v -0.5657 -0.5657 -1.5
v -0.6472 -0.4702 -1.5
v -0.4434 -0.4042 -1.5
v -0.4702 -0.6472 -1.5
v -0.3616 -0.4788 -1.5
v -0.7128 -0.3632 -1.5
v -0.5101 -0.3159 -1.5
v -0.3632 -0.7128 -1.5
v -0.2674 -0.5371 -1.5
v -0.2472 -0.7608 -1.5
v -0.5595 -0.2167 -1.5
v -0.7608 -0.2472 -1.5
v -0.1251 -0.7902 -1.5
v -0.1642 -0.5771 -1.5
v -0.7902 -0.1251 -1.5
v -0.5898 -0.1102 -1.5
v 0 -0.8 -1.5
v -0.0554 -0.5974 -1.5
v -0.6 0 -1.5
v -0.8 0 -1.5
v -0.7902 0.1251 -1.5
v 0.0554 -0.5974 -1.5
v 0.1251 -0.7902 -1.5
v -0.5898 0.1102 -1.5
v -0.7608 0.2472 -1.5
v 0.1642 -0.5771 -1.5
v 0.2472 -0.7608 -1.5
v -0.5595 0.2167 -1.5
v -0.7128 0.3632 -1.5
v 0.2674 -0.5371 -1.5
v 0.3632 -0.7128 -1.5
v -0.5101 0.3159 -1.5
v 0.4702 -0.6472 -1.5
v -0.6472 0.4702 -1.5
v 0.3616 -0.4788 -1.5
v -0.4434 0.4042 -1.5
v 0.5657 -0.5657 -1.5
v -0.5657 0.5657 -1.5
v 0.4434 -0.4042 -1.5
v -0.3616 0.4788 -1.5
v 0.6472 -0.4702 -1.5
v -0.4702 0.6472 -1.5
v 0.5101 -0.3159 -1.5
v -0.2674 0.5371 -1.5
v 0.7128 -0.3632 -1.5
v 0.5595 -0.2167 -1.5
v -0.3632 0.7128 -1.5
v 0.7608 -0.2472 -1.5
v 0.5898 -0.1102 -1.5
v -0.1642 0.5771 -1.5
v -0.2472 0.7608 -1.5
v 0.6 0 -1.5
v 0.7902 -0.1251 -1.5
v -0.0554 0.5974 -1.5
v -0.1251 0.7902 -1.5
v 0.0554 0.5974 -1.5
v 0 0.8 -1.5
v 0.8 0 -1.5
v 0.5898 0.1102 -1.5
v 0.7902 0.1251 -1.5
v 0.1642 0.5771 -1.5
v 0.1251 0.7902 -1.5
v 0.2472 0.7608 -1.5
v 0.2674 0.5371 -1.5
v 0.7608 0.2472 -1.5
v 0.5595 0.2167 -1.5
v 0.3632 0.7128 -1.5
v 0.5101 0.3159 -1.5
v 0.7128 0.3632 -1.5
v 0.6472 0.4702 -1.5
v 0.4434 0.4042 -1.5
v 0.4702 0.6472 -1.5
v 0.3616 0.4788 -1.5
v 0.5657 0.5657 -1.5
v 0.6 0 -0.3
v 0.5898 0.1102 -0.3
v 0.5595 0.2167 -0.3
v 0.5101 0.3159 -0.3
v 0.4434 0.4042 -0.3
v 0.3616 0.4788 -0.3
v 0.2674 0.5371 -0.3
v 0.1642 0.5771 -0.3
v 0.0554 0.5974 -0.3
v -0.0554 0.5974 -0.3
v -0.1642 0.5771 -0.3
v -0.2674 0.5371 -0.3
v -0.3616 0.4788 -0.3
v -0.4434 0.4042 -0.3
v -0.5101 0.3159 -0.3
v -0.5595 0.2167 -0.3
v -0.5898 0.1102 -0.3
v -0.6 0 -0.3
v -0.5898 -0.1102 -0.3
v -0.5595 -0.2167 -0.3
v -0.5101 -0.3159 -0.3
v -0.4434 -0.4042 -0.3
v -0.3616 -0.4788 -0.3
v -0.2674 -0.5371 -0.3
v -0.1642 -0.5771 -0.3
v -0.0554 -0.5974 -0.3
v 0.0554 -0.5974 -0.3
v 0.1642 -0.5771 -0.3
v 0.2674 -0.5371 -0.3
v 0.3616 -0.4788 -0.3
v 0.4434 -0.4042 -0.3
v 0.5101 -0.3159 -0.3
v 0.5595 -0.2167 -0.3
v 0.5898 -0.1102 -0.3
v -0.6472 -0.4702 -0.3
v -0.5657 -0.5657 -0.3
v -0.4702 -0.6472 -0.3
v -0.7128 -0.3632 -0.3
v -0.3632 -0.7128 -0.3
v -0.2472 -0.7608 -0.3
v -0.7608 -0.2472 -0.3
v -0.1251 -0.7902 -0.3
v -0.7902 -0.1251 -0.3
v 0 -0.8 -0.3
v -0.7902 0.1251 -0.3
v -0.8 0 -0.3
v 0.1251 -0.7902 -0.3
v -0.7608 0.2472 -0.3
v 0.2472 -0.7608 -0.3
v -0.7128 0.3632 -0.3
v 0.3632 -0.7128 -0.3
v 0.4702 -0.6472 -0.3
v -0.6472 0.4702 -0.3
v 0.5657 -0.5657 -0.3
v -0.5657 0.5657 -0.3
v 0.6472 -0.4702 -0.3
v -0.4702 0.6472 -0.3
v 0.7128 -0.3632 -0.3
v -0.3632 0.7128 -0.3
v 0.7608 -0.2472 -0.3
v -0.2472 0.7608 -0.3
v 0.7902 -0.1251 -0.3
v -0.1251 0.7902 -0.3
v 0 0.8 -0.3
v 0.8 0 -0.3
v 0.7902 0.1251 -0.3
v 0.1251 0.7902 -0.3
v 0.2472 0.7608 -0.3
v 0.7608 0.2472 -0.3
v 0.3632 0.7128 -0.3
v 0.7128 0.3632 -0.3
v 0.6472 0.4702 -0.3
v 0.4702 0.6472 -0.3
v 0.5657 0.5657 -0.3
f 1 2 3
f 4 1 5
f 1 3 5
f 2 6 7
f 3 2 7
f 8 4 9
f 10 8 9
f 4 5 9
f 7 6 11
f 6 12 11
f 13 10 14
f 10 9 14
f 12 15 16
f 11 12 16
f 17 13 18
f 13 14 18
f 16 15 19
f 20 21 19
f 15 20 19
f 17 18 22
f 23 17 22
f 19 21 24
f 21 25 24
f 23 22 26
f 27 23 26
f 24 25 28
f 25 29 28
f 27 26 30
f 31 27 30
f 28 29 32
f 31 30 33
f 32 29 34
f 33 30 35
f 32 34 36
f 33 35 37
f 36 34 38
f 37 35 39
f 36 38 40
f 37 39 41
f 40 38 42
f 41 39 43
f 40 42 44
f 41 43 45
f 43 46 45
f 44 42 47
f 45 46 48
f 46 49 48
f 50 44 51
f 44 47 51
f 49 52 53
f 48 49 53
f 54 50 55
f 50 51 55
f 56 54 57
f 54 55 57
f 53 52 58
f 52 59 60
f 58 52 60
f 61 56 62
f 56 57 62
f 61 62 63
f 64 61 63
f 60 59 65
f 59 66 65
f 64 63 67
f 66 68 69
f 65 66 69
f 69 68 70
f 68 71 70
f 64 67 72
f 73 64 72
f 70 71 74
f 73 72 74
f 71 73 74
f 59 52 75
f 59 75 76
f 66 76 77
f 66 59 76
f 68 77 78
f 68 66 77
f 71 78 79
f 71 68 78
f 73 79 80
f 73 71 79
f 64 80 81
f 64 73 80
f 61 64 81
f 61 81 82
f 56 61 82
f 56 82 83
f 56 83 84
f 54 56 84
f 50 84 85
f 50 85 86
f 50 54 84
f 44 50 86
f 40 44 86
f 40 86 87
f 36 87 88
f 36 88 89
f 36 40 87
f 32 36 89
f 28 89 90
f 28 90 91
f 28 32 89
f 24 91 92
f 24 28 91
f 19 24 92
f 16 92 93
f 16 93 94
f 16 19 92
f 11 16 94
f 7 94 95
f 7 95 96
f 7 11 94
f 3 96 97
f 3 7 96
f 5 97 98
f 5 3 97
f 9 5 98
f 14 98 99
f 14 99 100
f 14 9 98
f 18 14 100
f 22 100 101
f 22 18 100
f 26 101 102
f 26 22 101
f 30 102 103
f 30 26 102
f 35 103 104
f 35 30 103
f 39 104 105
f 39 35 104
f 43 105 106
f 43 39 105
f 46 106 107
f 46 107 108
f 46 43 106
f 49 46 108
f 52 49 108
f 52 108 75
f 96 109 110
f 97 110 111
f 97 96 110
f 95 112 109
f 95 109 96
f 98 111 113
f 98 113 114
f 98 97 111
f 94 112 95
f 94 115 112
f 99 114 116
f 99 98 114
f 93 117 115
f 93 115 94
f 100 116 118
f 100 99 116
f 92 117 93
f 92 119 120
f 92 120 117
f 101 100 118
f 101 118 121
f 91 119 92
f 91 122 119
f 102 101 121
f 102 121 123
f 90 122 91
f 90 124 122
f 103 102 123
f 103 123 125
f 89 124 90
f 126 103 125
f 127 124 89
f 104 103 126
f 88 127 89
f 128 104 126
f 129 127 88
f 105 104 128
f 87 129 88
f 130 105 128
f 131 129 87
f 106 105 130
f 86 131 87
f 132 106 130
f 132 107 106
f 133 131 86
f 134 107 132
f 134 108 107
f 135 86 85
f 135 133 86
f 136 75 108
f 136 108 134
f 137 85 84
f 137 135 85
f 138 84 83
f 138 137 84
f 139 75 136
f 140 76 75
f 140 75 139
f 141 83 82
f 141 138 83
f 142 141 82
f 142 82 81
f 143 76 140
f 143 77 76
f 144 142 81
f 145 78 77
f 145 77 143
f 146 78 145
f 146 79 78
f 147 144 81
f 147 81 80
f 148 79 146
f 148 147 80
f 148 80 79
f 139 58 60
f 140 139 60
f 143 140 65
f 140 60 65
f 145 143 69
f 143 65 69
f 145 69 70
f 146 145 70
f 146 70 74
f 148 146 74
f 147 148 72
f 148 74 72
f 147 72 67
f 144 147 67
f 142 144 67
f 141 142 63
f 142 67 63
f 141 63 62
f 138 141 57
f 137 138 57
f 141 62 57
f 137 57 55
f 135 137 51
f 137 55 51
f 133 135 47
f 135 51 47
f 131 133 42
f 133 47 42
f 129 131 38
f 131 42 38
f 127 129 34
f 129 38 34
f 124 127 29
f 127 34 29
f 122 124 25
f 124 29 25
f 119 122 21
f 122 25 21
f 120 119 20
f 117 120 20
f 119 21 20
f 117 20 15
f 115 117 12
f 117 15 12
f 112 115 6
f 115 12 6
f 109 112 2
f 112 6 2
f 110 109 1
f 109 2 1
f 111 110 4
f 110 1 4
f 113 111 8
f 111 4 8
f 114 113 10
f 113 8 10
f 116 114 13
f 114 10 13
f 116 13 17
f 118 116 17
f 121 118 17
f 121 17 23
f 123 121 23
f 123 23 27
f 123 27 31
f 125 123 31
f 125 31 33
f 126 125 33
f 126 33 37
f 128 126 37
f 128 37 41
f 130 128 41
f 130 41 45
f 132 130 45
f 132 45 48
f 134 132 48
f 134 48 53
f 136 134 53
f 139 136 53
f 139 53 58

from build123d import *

# Parameters (mm, degrees)
CYLINDER001_R     = 0.6
CYLINDER001_DEPTH = 1.2
CYLINDER_R        = 0.8
CYLINDER_DEPTH    = 1.2


with BuildPart() as zylinder001:
    # Cylinder001 → Cylinder001 (new body)
    with BuildSketch(Plane.XY):
        Circle(CYLINDER001_R)
    extrude(amount=CYLINDER001_DEPTH)


with BuildPart() as via:
    # Cylinder → Cylinder (new body)
    with BuildSketch(Plane.XY):
        Circle(CYLINDER_R)
    extrude(amount=CYLINDER_DEPTH)

    # Cut: cut Zylinder001
    add(zylinder001.part, mode=Mode.SUBTRACT)


with BuildPart() as via_1:
    # Clone placement: moved
    add(via.part.moved(Location((0, 0, -1.5))))


solid = via_1.part
